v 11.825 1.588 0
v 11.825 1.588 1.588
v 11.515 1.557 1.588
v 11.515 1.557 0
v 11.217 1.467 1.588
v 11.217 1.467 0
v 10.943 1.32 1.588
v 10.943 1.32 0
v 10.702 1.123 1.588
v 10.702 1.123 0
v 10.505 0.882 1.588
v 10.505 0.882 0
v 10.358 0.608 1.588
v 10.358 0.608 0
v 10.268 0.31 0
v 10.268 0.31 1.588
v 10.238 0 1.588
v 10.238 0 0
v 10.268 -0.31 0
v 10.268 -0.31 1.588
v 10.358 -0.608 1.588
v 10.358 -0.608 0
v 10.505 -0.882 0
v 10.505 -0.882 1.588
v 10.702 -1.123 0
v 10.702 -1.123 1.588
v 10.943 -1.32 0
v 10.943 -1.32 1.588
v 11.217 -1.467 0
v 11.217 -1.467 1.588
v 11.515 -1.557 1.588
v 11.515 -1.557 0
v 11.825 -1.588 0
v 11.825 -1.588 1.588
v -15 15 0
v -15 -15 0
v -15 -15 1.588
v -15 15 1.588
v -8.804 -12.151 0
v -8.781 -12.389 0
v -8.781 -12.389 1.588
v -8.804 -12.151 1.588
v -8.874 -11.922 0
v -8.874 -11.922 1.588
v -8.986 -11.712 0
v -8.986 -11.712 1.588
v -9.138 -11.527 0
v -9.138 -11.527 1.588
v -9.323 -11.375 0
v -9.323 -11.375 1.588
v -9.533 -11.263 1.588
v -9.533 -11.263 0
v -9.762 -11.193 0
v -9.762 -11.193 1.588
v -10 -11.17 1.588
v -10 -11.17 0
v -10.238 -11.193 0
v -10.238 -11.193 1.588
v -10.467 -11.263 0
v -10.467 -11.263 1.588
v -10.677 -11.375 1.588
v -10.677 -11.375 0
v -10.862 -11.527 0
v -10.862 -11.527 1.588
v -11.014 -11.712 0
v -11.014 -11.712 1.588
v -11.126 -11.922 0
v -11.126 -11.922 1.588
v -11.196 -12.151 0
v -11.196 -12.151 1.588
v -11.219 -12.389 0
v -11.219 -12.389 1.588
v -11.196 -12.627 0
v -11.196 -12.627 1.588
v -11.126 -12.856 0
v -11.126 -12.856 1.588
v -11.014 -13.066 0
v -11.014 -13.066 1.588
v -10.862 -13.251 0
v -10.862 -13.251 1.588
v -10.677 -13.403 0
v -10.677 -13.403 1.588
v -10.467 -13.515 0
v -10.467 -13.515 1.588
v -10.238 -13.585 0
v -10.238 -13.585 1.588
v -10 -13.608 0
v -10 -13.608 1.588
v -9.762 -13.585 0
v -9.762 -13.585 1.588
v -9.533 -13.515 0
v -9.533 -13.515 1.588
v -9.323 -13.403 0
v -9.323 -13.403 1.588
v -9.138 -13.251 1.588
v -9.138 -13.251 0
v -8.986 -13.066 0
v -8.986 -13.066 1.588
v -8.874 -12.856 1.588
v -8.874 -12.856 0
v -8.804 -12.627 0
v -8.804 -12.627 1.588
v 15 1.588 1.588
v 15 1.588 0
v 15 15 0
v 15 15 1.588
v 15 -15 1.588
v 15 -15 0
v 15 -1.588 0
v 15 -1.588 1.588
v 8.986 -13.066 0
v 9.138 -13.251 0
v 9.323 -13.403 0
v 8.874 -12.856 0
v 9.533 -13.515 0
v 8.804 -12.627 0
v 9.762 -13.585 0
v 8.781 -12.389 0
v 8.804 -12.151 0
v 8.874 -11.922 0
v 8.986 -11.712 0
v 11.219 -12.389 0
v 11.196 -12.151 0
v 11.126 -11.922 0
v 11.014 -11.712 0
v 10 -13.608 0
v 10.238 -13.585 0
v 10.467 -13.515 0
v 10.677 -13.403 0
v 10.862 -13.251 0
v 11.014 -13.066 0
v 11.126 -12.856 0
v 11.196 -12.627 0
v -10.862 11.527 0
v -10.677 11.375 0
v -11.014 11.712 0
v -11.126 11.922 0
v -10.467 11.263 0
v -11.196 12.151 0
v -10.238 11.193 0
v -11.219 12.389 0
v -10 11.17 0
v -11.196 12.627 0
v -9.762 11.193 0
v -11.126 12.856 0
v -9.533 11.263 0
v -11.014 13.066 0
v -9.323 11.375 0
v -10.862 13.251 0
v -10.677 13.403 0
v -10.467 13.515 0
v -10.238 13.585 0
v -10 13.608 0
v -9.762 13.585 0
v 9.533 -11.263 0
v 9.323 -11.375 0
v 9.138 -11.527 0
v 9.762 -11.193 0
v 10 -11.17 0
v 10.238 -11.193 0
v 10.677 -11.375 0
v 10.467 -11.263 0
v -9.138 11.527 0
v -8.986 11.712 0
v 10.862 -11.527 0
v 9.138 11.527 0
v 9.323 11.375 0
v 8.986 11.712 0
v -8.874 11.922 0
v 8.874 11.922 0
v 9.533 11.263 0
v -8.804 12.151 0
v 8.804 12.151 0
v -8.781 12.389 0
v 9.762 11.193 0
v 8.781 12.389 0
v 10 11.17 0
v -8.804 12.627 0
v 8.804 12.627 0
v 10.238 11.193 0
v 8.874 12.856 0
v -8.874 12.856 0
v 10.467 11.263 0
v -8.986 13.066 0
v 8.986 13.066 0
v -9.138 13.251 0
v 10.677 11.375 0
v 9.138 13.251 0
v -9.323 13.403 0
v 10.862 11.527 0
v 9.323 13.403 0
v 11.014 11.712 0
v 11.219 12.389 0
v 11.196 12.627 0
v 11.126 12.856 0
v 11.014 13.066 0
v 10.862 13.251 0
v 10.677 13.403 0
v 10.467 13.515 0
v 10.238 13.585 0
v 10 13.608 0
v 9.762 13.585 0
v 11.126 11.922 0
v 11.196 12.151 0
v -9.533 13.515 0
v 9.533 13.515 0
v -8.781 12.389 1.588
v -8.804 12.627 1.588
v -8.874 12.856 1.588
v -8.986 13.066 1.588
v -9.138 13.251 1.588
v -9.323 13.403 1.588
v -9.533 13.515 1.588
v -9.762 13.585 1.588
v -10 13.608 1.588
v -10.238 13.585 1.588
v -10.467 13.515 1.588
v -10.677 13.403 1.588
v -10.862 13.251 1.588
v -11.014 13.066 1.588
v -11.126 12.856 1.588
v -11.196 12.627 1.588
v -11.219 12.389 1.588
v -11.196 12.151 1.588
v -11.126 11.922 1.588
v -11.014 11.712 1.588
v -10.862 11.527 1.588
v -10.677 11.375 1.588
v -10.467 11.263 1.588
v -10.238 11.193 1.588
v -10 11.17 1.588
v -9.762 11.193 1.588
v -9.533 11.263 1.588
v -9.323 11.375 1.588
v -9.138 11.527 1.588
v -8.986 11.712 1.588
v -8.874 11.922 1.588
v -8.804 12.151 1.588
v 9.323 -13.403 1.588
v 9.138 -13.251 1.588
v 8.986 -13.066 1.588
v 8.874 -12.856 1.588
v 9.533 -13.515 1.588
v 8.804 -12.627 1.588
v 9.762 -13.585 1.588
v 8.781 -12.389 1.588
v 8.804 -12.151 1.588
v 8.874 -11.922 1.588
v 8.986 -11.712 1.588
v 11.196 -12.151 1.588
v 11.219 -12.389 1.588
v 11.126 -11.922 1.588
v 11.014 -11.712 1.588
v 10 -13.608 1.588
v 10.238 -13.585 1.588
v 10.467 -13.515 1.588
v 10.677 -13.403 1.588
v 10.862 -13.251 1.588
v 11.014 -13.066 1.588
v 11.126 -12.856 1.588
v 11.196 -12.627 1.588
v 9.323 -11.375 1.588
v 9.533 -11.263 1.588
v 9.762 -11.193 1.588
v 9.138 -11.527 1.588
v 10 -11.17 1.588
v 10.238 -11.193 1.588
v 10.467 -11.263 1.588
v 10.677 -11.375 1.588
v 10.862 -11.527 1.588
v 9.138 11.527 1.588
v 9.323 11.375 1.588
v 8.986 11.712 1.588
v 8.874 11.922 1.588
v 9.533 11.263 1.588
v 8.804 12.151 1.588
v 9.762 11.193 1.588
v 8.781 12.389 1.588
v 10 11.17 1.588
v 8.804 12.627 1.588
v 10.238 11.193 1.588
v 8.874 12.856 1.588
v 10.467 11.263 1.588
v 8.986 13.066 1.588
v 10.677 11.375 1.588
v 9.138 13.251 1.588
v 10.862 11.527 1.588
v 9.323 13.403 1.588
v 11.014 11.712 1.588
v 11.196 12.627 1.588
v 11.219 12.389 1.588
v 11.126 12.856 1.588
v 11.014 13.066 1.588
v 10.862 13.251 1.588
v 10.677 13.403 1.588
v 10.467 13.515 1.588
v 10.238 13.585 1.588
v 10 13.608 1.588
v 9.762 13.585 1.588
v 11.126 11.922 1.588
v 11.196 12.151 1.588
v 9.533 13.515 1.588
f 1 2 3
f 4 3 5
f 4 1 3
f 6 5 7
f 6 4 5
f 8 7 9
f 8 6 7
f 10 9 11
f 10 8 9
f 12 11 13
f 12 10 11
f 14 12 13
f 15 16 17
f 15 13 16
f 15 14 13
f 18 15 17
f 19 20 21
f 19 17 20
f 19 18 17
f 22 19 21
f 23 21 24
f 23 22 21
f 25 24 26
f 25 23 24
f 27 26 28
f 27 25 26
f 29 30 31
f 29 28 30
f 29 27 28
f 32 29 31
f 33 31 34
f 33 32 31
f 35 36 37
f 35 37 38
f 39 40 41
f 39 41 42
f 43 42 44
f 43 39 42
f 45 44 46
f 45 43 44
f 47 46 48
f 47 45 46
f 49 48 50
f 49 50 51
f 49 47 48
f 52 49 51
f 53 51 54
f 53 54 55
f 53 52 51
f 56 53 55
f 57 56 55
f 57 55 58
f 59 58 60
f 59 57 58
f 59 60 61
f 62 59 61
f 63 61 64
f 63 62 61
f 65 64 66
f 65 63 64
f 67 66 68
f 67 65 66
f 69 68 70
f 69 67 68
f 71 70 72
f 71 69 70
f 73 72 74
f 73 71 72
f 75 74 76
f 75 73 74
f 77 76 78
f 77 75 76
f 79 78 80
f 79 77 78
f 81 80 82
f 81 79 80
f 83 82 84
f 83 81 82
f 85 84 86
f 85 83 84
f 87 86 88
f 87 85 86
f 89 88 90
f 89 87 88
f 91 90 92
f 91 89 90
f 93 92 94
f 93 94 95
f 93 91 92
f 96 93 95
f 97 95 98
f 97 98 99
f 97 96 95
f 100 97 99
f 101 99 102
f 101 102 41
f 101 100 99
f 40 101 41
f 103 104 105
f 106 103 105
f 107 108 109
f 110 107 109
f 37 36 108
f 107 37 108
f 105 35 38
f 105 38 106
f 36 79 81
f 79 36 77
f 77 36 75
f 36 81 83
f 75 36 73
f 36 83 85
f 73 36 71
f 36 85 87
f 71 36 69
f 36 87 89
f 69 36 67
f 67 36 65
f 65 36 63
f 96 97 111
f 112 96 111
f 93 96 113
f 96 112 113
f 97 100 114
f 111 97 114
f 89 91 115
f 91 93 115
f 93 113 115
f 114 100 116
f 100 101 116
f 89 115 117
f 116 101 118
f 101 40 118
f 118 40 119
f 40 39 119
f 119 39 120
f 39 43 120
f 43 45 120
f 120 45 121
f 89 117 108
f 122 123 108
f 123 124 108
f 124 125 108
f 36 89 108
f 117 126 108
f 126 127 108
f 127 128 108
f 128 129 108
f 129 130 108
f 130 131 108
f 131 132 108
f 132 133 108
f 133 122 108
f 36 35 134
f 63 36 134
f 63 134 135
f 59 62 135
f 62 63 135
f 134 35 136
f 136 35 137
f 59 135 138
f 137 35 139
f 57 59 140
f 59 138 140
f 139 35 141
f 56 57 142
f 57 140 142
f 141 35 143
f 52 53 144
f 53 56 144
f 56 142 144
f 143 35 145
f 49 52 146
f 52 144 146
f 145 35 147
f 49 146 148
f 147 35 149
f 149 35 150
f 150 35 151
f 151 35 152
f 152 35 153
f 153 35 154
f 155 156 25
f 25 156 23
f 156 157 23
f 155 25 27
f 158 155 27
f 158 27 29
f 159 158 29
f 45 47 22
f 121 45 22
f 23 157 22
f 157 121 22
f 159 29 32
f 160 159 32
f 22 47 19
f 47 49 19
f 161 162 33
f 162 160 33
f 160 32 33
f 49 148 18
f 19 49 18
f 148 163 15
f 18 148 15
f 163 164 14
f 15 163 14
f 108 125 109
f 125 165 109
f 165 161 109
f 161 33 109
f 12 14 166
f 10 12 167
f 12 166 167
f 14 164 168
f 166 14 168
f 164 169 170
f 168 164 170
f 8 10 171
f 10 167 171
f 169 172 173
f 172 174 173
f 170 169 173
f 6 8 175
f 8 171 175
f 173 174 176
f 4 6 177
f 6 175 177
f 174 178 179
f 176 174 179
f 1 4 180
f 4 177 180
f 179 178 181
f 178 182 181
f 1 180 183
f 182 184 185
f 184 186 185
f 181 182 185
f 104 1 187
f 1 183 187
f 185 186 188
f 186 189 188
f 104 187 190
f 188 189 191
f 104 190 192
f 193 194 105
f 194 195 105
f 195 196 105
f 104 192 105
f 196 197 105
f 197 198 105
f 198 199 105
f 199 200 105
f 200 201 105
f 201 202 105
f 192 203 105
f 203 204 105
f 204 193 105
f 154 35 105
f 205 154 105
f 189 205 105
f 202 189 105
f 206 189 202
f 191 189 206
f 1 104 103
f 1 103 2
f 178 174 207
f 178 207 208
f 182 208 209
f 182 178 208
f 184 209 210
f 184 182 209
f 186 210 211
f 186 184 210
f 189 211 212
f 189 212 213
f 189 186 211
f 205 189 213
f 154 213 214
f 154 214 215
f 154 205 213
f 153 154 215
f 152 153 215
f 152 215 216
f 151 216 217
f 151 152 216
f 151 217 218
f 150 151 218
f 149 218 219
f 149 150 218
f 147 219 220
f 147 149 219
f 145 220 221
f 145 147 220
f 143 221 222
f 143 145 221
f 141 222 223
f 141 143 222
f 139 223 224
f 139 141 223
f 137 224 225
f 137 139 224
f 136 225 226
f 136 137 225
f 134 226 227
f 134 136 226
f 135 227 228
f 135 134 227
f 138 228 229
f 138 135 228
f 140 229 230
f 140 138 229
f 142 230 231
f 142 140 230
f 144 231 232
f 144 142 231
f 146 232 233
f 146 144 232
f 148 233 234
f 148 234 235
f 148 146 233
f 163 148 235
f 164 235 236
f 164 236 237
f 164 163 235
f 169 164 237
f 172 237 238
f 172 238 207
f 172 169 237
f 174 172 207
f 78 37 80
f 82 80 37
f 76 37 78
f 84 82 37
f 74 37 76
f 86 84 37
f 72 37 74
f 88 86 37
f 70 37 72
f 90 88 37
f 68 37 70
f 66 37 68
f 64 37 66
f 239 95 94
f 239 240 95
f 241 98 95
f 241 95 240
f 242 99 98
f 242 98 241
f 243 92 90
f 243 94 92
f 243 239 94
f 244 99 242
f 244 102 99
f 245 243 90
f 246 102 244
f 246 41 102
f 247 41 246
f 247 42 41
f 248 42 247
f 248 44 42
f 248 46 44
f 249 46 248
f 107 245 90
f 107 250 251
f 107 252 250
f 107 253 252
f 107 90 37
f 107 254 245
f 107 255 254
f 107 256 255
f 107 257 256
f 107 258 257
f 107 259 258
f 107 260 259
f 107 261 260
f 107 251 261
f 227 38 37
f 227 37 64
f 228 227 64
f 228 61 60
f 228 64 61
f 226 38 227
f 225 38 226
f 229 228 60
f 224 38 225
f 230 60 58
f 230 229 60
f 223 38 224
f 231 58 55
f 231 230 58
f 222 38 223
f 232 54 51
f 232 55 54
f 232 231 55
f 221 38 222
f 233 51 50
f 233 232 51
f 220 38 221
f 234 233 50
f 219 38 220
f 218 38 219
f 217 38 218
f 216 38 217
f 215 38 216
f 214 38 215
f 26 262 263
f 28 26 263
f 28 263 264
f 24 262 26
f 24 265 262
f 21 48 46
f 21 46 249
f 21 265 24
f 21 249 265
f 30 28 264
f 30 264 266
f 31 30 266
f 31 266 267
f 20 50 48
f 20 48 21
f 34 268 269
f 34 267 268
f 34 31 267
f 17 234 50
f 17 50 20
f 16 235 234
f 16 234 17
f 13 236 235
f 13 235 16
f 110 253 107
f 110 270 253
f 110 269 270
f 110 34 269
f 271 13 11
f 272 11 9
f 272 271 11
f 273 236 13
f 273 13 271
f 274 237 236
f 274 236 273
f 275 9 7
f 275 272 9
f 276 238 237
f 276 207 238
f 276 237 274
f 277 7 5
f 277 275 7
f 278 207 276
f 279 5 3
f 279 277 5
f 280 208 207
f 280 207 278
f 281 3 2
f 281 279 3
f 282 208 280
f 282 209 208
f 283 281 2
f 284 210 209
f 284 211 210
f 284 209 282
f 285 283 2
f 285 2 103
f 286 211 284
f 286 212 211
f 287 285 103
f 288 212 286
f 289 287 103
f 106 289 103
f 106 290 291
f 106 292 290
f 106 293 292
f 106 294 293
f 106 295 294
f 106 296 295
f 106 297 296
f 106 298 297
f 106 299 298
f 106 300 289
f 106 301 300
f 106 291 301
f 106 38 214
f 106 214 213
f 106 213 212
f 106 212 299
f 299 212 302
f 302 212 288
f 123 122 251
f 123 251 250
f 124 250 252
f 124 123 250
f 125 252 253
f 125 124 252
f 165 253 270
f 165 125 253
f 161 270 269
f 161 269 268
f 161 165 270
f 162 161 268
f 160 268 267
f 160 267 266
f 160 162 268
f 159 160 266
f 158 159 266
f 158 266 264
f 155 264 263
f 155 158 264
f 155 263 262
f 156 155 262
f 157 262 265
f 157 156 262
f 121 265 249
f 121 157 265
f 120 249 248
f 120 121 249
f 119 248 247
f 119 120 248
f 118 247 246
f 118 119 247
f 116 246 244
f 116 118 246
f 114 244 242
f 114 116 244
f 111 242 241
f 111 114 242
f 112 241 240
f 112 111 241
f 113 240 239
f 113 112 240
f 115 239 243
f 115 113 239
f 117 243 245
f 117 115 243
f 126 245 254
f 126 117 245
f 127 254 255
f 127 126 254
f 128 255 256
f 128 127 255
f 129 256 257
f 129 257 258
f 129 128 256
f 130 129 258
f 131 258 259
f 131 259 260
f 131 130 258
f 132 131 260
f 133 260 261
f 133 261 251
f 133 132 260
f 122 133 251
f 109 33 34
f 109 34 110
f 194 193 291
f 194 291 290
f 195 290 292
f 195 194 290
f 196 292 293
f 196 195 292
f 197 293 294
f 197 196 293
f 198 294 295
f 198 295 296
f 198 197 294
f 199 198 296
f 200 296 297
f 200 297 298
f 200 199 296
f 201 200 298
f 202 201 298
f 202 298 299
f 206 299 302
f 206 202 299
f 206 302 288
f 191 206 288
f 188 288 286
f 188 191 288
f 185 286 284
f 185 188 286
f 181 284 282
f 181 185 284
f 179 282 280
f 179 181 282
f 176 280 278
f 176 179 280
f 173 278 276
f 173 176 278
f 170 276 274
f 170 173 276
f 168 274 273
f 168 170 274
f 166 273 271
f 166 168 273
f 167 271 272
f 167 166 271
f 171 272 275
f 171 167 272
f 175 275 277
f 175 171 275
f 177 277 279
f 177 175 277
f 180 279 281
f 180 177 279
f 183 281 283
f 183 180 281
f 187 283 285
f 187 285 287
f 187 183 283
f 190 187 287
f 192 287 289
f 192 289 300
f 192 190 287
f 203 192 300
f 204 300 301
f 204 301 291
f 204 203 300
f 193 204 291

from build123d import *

# Parameters (mm, degrees)
SKETCH2_W           = 30
SKETCH2_H           = 30
SKETCH2_R           = 1.2192
BOSS_EXTRUDE1_DEPTH = 1.5875
CUT_EXTRUDE1_DEPTH  = 22.272521154


with BuildPart() as part:
    # Sketch2 → Boss-Extrude1 (new body)
    with BuildSketch(Plane.XY):
        Rectangle(SKETCH2_W, SKETCH2_H)
        with Locations((-10, 12.38905)):
            Circle(SKETCH2_R, mode=Mode.SUBTRACT)
        with Locations((10, 12.38905)):
            Circle(SKETCH2_R, mode=Mode.SUBTRACT)
        with Locations((10, -12.38905)):
            Circle(SKETCH2_R, mode=Mode.SUBTRACT)
        with Locations((-10, -12.38905)):
            Circle(SKETCH2_R, mode=Mode.SUBTRACT)
    extrude(amount=BOSS_EXTRUDE1_DEPTH)

    # Sketch3 → Cut-Extrude1 (cut, through all)
    with BuildSketch(Plane(origin=(0, 0, 0), x_dir=(-1, 0, 0), z_dir=(0, 0, -1))):
        with BuildLine():
            Line((-11.825, -1.5875), (-15, -1.5875))
            Line((-15, -1.5875), (-15, 1.5875))
            Line((-15, 1.5875), (-11.825, 1.5875))
            ThreePointArc((-11.825, 1.5875), (-10.2375, 0), (-11.825, -1.5875))
        make_face()
    extrude(amount=-CUT_EXTRUDE1_DEPTH, mode=Mode.SUBTRACT)


solid = part.part
